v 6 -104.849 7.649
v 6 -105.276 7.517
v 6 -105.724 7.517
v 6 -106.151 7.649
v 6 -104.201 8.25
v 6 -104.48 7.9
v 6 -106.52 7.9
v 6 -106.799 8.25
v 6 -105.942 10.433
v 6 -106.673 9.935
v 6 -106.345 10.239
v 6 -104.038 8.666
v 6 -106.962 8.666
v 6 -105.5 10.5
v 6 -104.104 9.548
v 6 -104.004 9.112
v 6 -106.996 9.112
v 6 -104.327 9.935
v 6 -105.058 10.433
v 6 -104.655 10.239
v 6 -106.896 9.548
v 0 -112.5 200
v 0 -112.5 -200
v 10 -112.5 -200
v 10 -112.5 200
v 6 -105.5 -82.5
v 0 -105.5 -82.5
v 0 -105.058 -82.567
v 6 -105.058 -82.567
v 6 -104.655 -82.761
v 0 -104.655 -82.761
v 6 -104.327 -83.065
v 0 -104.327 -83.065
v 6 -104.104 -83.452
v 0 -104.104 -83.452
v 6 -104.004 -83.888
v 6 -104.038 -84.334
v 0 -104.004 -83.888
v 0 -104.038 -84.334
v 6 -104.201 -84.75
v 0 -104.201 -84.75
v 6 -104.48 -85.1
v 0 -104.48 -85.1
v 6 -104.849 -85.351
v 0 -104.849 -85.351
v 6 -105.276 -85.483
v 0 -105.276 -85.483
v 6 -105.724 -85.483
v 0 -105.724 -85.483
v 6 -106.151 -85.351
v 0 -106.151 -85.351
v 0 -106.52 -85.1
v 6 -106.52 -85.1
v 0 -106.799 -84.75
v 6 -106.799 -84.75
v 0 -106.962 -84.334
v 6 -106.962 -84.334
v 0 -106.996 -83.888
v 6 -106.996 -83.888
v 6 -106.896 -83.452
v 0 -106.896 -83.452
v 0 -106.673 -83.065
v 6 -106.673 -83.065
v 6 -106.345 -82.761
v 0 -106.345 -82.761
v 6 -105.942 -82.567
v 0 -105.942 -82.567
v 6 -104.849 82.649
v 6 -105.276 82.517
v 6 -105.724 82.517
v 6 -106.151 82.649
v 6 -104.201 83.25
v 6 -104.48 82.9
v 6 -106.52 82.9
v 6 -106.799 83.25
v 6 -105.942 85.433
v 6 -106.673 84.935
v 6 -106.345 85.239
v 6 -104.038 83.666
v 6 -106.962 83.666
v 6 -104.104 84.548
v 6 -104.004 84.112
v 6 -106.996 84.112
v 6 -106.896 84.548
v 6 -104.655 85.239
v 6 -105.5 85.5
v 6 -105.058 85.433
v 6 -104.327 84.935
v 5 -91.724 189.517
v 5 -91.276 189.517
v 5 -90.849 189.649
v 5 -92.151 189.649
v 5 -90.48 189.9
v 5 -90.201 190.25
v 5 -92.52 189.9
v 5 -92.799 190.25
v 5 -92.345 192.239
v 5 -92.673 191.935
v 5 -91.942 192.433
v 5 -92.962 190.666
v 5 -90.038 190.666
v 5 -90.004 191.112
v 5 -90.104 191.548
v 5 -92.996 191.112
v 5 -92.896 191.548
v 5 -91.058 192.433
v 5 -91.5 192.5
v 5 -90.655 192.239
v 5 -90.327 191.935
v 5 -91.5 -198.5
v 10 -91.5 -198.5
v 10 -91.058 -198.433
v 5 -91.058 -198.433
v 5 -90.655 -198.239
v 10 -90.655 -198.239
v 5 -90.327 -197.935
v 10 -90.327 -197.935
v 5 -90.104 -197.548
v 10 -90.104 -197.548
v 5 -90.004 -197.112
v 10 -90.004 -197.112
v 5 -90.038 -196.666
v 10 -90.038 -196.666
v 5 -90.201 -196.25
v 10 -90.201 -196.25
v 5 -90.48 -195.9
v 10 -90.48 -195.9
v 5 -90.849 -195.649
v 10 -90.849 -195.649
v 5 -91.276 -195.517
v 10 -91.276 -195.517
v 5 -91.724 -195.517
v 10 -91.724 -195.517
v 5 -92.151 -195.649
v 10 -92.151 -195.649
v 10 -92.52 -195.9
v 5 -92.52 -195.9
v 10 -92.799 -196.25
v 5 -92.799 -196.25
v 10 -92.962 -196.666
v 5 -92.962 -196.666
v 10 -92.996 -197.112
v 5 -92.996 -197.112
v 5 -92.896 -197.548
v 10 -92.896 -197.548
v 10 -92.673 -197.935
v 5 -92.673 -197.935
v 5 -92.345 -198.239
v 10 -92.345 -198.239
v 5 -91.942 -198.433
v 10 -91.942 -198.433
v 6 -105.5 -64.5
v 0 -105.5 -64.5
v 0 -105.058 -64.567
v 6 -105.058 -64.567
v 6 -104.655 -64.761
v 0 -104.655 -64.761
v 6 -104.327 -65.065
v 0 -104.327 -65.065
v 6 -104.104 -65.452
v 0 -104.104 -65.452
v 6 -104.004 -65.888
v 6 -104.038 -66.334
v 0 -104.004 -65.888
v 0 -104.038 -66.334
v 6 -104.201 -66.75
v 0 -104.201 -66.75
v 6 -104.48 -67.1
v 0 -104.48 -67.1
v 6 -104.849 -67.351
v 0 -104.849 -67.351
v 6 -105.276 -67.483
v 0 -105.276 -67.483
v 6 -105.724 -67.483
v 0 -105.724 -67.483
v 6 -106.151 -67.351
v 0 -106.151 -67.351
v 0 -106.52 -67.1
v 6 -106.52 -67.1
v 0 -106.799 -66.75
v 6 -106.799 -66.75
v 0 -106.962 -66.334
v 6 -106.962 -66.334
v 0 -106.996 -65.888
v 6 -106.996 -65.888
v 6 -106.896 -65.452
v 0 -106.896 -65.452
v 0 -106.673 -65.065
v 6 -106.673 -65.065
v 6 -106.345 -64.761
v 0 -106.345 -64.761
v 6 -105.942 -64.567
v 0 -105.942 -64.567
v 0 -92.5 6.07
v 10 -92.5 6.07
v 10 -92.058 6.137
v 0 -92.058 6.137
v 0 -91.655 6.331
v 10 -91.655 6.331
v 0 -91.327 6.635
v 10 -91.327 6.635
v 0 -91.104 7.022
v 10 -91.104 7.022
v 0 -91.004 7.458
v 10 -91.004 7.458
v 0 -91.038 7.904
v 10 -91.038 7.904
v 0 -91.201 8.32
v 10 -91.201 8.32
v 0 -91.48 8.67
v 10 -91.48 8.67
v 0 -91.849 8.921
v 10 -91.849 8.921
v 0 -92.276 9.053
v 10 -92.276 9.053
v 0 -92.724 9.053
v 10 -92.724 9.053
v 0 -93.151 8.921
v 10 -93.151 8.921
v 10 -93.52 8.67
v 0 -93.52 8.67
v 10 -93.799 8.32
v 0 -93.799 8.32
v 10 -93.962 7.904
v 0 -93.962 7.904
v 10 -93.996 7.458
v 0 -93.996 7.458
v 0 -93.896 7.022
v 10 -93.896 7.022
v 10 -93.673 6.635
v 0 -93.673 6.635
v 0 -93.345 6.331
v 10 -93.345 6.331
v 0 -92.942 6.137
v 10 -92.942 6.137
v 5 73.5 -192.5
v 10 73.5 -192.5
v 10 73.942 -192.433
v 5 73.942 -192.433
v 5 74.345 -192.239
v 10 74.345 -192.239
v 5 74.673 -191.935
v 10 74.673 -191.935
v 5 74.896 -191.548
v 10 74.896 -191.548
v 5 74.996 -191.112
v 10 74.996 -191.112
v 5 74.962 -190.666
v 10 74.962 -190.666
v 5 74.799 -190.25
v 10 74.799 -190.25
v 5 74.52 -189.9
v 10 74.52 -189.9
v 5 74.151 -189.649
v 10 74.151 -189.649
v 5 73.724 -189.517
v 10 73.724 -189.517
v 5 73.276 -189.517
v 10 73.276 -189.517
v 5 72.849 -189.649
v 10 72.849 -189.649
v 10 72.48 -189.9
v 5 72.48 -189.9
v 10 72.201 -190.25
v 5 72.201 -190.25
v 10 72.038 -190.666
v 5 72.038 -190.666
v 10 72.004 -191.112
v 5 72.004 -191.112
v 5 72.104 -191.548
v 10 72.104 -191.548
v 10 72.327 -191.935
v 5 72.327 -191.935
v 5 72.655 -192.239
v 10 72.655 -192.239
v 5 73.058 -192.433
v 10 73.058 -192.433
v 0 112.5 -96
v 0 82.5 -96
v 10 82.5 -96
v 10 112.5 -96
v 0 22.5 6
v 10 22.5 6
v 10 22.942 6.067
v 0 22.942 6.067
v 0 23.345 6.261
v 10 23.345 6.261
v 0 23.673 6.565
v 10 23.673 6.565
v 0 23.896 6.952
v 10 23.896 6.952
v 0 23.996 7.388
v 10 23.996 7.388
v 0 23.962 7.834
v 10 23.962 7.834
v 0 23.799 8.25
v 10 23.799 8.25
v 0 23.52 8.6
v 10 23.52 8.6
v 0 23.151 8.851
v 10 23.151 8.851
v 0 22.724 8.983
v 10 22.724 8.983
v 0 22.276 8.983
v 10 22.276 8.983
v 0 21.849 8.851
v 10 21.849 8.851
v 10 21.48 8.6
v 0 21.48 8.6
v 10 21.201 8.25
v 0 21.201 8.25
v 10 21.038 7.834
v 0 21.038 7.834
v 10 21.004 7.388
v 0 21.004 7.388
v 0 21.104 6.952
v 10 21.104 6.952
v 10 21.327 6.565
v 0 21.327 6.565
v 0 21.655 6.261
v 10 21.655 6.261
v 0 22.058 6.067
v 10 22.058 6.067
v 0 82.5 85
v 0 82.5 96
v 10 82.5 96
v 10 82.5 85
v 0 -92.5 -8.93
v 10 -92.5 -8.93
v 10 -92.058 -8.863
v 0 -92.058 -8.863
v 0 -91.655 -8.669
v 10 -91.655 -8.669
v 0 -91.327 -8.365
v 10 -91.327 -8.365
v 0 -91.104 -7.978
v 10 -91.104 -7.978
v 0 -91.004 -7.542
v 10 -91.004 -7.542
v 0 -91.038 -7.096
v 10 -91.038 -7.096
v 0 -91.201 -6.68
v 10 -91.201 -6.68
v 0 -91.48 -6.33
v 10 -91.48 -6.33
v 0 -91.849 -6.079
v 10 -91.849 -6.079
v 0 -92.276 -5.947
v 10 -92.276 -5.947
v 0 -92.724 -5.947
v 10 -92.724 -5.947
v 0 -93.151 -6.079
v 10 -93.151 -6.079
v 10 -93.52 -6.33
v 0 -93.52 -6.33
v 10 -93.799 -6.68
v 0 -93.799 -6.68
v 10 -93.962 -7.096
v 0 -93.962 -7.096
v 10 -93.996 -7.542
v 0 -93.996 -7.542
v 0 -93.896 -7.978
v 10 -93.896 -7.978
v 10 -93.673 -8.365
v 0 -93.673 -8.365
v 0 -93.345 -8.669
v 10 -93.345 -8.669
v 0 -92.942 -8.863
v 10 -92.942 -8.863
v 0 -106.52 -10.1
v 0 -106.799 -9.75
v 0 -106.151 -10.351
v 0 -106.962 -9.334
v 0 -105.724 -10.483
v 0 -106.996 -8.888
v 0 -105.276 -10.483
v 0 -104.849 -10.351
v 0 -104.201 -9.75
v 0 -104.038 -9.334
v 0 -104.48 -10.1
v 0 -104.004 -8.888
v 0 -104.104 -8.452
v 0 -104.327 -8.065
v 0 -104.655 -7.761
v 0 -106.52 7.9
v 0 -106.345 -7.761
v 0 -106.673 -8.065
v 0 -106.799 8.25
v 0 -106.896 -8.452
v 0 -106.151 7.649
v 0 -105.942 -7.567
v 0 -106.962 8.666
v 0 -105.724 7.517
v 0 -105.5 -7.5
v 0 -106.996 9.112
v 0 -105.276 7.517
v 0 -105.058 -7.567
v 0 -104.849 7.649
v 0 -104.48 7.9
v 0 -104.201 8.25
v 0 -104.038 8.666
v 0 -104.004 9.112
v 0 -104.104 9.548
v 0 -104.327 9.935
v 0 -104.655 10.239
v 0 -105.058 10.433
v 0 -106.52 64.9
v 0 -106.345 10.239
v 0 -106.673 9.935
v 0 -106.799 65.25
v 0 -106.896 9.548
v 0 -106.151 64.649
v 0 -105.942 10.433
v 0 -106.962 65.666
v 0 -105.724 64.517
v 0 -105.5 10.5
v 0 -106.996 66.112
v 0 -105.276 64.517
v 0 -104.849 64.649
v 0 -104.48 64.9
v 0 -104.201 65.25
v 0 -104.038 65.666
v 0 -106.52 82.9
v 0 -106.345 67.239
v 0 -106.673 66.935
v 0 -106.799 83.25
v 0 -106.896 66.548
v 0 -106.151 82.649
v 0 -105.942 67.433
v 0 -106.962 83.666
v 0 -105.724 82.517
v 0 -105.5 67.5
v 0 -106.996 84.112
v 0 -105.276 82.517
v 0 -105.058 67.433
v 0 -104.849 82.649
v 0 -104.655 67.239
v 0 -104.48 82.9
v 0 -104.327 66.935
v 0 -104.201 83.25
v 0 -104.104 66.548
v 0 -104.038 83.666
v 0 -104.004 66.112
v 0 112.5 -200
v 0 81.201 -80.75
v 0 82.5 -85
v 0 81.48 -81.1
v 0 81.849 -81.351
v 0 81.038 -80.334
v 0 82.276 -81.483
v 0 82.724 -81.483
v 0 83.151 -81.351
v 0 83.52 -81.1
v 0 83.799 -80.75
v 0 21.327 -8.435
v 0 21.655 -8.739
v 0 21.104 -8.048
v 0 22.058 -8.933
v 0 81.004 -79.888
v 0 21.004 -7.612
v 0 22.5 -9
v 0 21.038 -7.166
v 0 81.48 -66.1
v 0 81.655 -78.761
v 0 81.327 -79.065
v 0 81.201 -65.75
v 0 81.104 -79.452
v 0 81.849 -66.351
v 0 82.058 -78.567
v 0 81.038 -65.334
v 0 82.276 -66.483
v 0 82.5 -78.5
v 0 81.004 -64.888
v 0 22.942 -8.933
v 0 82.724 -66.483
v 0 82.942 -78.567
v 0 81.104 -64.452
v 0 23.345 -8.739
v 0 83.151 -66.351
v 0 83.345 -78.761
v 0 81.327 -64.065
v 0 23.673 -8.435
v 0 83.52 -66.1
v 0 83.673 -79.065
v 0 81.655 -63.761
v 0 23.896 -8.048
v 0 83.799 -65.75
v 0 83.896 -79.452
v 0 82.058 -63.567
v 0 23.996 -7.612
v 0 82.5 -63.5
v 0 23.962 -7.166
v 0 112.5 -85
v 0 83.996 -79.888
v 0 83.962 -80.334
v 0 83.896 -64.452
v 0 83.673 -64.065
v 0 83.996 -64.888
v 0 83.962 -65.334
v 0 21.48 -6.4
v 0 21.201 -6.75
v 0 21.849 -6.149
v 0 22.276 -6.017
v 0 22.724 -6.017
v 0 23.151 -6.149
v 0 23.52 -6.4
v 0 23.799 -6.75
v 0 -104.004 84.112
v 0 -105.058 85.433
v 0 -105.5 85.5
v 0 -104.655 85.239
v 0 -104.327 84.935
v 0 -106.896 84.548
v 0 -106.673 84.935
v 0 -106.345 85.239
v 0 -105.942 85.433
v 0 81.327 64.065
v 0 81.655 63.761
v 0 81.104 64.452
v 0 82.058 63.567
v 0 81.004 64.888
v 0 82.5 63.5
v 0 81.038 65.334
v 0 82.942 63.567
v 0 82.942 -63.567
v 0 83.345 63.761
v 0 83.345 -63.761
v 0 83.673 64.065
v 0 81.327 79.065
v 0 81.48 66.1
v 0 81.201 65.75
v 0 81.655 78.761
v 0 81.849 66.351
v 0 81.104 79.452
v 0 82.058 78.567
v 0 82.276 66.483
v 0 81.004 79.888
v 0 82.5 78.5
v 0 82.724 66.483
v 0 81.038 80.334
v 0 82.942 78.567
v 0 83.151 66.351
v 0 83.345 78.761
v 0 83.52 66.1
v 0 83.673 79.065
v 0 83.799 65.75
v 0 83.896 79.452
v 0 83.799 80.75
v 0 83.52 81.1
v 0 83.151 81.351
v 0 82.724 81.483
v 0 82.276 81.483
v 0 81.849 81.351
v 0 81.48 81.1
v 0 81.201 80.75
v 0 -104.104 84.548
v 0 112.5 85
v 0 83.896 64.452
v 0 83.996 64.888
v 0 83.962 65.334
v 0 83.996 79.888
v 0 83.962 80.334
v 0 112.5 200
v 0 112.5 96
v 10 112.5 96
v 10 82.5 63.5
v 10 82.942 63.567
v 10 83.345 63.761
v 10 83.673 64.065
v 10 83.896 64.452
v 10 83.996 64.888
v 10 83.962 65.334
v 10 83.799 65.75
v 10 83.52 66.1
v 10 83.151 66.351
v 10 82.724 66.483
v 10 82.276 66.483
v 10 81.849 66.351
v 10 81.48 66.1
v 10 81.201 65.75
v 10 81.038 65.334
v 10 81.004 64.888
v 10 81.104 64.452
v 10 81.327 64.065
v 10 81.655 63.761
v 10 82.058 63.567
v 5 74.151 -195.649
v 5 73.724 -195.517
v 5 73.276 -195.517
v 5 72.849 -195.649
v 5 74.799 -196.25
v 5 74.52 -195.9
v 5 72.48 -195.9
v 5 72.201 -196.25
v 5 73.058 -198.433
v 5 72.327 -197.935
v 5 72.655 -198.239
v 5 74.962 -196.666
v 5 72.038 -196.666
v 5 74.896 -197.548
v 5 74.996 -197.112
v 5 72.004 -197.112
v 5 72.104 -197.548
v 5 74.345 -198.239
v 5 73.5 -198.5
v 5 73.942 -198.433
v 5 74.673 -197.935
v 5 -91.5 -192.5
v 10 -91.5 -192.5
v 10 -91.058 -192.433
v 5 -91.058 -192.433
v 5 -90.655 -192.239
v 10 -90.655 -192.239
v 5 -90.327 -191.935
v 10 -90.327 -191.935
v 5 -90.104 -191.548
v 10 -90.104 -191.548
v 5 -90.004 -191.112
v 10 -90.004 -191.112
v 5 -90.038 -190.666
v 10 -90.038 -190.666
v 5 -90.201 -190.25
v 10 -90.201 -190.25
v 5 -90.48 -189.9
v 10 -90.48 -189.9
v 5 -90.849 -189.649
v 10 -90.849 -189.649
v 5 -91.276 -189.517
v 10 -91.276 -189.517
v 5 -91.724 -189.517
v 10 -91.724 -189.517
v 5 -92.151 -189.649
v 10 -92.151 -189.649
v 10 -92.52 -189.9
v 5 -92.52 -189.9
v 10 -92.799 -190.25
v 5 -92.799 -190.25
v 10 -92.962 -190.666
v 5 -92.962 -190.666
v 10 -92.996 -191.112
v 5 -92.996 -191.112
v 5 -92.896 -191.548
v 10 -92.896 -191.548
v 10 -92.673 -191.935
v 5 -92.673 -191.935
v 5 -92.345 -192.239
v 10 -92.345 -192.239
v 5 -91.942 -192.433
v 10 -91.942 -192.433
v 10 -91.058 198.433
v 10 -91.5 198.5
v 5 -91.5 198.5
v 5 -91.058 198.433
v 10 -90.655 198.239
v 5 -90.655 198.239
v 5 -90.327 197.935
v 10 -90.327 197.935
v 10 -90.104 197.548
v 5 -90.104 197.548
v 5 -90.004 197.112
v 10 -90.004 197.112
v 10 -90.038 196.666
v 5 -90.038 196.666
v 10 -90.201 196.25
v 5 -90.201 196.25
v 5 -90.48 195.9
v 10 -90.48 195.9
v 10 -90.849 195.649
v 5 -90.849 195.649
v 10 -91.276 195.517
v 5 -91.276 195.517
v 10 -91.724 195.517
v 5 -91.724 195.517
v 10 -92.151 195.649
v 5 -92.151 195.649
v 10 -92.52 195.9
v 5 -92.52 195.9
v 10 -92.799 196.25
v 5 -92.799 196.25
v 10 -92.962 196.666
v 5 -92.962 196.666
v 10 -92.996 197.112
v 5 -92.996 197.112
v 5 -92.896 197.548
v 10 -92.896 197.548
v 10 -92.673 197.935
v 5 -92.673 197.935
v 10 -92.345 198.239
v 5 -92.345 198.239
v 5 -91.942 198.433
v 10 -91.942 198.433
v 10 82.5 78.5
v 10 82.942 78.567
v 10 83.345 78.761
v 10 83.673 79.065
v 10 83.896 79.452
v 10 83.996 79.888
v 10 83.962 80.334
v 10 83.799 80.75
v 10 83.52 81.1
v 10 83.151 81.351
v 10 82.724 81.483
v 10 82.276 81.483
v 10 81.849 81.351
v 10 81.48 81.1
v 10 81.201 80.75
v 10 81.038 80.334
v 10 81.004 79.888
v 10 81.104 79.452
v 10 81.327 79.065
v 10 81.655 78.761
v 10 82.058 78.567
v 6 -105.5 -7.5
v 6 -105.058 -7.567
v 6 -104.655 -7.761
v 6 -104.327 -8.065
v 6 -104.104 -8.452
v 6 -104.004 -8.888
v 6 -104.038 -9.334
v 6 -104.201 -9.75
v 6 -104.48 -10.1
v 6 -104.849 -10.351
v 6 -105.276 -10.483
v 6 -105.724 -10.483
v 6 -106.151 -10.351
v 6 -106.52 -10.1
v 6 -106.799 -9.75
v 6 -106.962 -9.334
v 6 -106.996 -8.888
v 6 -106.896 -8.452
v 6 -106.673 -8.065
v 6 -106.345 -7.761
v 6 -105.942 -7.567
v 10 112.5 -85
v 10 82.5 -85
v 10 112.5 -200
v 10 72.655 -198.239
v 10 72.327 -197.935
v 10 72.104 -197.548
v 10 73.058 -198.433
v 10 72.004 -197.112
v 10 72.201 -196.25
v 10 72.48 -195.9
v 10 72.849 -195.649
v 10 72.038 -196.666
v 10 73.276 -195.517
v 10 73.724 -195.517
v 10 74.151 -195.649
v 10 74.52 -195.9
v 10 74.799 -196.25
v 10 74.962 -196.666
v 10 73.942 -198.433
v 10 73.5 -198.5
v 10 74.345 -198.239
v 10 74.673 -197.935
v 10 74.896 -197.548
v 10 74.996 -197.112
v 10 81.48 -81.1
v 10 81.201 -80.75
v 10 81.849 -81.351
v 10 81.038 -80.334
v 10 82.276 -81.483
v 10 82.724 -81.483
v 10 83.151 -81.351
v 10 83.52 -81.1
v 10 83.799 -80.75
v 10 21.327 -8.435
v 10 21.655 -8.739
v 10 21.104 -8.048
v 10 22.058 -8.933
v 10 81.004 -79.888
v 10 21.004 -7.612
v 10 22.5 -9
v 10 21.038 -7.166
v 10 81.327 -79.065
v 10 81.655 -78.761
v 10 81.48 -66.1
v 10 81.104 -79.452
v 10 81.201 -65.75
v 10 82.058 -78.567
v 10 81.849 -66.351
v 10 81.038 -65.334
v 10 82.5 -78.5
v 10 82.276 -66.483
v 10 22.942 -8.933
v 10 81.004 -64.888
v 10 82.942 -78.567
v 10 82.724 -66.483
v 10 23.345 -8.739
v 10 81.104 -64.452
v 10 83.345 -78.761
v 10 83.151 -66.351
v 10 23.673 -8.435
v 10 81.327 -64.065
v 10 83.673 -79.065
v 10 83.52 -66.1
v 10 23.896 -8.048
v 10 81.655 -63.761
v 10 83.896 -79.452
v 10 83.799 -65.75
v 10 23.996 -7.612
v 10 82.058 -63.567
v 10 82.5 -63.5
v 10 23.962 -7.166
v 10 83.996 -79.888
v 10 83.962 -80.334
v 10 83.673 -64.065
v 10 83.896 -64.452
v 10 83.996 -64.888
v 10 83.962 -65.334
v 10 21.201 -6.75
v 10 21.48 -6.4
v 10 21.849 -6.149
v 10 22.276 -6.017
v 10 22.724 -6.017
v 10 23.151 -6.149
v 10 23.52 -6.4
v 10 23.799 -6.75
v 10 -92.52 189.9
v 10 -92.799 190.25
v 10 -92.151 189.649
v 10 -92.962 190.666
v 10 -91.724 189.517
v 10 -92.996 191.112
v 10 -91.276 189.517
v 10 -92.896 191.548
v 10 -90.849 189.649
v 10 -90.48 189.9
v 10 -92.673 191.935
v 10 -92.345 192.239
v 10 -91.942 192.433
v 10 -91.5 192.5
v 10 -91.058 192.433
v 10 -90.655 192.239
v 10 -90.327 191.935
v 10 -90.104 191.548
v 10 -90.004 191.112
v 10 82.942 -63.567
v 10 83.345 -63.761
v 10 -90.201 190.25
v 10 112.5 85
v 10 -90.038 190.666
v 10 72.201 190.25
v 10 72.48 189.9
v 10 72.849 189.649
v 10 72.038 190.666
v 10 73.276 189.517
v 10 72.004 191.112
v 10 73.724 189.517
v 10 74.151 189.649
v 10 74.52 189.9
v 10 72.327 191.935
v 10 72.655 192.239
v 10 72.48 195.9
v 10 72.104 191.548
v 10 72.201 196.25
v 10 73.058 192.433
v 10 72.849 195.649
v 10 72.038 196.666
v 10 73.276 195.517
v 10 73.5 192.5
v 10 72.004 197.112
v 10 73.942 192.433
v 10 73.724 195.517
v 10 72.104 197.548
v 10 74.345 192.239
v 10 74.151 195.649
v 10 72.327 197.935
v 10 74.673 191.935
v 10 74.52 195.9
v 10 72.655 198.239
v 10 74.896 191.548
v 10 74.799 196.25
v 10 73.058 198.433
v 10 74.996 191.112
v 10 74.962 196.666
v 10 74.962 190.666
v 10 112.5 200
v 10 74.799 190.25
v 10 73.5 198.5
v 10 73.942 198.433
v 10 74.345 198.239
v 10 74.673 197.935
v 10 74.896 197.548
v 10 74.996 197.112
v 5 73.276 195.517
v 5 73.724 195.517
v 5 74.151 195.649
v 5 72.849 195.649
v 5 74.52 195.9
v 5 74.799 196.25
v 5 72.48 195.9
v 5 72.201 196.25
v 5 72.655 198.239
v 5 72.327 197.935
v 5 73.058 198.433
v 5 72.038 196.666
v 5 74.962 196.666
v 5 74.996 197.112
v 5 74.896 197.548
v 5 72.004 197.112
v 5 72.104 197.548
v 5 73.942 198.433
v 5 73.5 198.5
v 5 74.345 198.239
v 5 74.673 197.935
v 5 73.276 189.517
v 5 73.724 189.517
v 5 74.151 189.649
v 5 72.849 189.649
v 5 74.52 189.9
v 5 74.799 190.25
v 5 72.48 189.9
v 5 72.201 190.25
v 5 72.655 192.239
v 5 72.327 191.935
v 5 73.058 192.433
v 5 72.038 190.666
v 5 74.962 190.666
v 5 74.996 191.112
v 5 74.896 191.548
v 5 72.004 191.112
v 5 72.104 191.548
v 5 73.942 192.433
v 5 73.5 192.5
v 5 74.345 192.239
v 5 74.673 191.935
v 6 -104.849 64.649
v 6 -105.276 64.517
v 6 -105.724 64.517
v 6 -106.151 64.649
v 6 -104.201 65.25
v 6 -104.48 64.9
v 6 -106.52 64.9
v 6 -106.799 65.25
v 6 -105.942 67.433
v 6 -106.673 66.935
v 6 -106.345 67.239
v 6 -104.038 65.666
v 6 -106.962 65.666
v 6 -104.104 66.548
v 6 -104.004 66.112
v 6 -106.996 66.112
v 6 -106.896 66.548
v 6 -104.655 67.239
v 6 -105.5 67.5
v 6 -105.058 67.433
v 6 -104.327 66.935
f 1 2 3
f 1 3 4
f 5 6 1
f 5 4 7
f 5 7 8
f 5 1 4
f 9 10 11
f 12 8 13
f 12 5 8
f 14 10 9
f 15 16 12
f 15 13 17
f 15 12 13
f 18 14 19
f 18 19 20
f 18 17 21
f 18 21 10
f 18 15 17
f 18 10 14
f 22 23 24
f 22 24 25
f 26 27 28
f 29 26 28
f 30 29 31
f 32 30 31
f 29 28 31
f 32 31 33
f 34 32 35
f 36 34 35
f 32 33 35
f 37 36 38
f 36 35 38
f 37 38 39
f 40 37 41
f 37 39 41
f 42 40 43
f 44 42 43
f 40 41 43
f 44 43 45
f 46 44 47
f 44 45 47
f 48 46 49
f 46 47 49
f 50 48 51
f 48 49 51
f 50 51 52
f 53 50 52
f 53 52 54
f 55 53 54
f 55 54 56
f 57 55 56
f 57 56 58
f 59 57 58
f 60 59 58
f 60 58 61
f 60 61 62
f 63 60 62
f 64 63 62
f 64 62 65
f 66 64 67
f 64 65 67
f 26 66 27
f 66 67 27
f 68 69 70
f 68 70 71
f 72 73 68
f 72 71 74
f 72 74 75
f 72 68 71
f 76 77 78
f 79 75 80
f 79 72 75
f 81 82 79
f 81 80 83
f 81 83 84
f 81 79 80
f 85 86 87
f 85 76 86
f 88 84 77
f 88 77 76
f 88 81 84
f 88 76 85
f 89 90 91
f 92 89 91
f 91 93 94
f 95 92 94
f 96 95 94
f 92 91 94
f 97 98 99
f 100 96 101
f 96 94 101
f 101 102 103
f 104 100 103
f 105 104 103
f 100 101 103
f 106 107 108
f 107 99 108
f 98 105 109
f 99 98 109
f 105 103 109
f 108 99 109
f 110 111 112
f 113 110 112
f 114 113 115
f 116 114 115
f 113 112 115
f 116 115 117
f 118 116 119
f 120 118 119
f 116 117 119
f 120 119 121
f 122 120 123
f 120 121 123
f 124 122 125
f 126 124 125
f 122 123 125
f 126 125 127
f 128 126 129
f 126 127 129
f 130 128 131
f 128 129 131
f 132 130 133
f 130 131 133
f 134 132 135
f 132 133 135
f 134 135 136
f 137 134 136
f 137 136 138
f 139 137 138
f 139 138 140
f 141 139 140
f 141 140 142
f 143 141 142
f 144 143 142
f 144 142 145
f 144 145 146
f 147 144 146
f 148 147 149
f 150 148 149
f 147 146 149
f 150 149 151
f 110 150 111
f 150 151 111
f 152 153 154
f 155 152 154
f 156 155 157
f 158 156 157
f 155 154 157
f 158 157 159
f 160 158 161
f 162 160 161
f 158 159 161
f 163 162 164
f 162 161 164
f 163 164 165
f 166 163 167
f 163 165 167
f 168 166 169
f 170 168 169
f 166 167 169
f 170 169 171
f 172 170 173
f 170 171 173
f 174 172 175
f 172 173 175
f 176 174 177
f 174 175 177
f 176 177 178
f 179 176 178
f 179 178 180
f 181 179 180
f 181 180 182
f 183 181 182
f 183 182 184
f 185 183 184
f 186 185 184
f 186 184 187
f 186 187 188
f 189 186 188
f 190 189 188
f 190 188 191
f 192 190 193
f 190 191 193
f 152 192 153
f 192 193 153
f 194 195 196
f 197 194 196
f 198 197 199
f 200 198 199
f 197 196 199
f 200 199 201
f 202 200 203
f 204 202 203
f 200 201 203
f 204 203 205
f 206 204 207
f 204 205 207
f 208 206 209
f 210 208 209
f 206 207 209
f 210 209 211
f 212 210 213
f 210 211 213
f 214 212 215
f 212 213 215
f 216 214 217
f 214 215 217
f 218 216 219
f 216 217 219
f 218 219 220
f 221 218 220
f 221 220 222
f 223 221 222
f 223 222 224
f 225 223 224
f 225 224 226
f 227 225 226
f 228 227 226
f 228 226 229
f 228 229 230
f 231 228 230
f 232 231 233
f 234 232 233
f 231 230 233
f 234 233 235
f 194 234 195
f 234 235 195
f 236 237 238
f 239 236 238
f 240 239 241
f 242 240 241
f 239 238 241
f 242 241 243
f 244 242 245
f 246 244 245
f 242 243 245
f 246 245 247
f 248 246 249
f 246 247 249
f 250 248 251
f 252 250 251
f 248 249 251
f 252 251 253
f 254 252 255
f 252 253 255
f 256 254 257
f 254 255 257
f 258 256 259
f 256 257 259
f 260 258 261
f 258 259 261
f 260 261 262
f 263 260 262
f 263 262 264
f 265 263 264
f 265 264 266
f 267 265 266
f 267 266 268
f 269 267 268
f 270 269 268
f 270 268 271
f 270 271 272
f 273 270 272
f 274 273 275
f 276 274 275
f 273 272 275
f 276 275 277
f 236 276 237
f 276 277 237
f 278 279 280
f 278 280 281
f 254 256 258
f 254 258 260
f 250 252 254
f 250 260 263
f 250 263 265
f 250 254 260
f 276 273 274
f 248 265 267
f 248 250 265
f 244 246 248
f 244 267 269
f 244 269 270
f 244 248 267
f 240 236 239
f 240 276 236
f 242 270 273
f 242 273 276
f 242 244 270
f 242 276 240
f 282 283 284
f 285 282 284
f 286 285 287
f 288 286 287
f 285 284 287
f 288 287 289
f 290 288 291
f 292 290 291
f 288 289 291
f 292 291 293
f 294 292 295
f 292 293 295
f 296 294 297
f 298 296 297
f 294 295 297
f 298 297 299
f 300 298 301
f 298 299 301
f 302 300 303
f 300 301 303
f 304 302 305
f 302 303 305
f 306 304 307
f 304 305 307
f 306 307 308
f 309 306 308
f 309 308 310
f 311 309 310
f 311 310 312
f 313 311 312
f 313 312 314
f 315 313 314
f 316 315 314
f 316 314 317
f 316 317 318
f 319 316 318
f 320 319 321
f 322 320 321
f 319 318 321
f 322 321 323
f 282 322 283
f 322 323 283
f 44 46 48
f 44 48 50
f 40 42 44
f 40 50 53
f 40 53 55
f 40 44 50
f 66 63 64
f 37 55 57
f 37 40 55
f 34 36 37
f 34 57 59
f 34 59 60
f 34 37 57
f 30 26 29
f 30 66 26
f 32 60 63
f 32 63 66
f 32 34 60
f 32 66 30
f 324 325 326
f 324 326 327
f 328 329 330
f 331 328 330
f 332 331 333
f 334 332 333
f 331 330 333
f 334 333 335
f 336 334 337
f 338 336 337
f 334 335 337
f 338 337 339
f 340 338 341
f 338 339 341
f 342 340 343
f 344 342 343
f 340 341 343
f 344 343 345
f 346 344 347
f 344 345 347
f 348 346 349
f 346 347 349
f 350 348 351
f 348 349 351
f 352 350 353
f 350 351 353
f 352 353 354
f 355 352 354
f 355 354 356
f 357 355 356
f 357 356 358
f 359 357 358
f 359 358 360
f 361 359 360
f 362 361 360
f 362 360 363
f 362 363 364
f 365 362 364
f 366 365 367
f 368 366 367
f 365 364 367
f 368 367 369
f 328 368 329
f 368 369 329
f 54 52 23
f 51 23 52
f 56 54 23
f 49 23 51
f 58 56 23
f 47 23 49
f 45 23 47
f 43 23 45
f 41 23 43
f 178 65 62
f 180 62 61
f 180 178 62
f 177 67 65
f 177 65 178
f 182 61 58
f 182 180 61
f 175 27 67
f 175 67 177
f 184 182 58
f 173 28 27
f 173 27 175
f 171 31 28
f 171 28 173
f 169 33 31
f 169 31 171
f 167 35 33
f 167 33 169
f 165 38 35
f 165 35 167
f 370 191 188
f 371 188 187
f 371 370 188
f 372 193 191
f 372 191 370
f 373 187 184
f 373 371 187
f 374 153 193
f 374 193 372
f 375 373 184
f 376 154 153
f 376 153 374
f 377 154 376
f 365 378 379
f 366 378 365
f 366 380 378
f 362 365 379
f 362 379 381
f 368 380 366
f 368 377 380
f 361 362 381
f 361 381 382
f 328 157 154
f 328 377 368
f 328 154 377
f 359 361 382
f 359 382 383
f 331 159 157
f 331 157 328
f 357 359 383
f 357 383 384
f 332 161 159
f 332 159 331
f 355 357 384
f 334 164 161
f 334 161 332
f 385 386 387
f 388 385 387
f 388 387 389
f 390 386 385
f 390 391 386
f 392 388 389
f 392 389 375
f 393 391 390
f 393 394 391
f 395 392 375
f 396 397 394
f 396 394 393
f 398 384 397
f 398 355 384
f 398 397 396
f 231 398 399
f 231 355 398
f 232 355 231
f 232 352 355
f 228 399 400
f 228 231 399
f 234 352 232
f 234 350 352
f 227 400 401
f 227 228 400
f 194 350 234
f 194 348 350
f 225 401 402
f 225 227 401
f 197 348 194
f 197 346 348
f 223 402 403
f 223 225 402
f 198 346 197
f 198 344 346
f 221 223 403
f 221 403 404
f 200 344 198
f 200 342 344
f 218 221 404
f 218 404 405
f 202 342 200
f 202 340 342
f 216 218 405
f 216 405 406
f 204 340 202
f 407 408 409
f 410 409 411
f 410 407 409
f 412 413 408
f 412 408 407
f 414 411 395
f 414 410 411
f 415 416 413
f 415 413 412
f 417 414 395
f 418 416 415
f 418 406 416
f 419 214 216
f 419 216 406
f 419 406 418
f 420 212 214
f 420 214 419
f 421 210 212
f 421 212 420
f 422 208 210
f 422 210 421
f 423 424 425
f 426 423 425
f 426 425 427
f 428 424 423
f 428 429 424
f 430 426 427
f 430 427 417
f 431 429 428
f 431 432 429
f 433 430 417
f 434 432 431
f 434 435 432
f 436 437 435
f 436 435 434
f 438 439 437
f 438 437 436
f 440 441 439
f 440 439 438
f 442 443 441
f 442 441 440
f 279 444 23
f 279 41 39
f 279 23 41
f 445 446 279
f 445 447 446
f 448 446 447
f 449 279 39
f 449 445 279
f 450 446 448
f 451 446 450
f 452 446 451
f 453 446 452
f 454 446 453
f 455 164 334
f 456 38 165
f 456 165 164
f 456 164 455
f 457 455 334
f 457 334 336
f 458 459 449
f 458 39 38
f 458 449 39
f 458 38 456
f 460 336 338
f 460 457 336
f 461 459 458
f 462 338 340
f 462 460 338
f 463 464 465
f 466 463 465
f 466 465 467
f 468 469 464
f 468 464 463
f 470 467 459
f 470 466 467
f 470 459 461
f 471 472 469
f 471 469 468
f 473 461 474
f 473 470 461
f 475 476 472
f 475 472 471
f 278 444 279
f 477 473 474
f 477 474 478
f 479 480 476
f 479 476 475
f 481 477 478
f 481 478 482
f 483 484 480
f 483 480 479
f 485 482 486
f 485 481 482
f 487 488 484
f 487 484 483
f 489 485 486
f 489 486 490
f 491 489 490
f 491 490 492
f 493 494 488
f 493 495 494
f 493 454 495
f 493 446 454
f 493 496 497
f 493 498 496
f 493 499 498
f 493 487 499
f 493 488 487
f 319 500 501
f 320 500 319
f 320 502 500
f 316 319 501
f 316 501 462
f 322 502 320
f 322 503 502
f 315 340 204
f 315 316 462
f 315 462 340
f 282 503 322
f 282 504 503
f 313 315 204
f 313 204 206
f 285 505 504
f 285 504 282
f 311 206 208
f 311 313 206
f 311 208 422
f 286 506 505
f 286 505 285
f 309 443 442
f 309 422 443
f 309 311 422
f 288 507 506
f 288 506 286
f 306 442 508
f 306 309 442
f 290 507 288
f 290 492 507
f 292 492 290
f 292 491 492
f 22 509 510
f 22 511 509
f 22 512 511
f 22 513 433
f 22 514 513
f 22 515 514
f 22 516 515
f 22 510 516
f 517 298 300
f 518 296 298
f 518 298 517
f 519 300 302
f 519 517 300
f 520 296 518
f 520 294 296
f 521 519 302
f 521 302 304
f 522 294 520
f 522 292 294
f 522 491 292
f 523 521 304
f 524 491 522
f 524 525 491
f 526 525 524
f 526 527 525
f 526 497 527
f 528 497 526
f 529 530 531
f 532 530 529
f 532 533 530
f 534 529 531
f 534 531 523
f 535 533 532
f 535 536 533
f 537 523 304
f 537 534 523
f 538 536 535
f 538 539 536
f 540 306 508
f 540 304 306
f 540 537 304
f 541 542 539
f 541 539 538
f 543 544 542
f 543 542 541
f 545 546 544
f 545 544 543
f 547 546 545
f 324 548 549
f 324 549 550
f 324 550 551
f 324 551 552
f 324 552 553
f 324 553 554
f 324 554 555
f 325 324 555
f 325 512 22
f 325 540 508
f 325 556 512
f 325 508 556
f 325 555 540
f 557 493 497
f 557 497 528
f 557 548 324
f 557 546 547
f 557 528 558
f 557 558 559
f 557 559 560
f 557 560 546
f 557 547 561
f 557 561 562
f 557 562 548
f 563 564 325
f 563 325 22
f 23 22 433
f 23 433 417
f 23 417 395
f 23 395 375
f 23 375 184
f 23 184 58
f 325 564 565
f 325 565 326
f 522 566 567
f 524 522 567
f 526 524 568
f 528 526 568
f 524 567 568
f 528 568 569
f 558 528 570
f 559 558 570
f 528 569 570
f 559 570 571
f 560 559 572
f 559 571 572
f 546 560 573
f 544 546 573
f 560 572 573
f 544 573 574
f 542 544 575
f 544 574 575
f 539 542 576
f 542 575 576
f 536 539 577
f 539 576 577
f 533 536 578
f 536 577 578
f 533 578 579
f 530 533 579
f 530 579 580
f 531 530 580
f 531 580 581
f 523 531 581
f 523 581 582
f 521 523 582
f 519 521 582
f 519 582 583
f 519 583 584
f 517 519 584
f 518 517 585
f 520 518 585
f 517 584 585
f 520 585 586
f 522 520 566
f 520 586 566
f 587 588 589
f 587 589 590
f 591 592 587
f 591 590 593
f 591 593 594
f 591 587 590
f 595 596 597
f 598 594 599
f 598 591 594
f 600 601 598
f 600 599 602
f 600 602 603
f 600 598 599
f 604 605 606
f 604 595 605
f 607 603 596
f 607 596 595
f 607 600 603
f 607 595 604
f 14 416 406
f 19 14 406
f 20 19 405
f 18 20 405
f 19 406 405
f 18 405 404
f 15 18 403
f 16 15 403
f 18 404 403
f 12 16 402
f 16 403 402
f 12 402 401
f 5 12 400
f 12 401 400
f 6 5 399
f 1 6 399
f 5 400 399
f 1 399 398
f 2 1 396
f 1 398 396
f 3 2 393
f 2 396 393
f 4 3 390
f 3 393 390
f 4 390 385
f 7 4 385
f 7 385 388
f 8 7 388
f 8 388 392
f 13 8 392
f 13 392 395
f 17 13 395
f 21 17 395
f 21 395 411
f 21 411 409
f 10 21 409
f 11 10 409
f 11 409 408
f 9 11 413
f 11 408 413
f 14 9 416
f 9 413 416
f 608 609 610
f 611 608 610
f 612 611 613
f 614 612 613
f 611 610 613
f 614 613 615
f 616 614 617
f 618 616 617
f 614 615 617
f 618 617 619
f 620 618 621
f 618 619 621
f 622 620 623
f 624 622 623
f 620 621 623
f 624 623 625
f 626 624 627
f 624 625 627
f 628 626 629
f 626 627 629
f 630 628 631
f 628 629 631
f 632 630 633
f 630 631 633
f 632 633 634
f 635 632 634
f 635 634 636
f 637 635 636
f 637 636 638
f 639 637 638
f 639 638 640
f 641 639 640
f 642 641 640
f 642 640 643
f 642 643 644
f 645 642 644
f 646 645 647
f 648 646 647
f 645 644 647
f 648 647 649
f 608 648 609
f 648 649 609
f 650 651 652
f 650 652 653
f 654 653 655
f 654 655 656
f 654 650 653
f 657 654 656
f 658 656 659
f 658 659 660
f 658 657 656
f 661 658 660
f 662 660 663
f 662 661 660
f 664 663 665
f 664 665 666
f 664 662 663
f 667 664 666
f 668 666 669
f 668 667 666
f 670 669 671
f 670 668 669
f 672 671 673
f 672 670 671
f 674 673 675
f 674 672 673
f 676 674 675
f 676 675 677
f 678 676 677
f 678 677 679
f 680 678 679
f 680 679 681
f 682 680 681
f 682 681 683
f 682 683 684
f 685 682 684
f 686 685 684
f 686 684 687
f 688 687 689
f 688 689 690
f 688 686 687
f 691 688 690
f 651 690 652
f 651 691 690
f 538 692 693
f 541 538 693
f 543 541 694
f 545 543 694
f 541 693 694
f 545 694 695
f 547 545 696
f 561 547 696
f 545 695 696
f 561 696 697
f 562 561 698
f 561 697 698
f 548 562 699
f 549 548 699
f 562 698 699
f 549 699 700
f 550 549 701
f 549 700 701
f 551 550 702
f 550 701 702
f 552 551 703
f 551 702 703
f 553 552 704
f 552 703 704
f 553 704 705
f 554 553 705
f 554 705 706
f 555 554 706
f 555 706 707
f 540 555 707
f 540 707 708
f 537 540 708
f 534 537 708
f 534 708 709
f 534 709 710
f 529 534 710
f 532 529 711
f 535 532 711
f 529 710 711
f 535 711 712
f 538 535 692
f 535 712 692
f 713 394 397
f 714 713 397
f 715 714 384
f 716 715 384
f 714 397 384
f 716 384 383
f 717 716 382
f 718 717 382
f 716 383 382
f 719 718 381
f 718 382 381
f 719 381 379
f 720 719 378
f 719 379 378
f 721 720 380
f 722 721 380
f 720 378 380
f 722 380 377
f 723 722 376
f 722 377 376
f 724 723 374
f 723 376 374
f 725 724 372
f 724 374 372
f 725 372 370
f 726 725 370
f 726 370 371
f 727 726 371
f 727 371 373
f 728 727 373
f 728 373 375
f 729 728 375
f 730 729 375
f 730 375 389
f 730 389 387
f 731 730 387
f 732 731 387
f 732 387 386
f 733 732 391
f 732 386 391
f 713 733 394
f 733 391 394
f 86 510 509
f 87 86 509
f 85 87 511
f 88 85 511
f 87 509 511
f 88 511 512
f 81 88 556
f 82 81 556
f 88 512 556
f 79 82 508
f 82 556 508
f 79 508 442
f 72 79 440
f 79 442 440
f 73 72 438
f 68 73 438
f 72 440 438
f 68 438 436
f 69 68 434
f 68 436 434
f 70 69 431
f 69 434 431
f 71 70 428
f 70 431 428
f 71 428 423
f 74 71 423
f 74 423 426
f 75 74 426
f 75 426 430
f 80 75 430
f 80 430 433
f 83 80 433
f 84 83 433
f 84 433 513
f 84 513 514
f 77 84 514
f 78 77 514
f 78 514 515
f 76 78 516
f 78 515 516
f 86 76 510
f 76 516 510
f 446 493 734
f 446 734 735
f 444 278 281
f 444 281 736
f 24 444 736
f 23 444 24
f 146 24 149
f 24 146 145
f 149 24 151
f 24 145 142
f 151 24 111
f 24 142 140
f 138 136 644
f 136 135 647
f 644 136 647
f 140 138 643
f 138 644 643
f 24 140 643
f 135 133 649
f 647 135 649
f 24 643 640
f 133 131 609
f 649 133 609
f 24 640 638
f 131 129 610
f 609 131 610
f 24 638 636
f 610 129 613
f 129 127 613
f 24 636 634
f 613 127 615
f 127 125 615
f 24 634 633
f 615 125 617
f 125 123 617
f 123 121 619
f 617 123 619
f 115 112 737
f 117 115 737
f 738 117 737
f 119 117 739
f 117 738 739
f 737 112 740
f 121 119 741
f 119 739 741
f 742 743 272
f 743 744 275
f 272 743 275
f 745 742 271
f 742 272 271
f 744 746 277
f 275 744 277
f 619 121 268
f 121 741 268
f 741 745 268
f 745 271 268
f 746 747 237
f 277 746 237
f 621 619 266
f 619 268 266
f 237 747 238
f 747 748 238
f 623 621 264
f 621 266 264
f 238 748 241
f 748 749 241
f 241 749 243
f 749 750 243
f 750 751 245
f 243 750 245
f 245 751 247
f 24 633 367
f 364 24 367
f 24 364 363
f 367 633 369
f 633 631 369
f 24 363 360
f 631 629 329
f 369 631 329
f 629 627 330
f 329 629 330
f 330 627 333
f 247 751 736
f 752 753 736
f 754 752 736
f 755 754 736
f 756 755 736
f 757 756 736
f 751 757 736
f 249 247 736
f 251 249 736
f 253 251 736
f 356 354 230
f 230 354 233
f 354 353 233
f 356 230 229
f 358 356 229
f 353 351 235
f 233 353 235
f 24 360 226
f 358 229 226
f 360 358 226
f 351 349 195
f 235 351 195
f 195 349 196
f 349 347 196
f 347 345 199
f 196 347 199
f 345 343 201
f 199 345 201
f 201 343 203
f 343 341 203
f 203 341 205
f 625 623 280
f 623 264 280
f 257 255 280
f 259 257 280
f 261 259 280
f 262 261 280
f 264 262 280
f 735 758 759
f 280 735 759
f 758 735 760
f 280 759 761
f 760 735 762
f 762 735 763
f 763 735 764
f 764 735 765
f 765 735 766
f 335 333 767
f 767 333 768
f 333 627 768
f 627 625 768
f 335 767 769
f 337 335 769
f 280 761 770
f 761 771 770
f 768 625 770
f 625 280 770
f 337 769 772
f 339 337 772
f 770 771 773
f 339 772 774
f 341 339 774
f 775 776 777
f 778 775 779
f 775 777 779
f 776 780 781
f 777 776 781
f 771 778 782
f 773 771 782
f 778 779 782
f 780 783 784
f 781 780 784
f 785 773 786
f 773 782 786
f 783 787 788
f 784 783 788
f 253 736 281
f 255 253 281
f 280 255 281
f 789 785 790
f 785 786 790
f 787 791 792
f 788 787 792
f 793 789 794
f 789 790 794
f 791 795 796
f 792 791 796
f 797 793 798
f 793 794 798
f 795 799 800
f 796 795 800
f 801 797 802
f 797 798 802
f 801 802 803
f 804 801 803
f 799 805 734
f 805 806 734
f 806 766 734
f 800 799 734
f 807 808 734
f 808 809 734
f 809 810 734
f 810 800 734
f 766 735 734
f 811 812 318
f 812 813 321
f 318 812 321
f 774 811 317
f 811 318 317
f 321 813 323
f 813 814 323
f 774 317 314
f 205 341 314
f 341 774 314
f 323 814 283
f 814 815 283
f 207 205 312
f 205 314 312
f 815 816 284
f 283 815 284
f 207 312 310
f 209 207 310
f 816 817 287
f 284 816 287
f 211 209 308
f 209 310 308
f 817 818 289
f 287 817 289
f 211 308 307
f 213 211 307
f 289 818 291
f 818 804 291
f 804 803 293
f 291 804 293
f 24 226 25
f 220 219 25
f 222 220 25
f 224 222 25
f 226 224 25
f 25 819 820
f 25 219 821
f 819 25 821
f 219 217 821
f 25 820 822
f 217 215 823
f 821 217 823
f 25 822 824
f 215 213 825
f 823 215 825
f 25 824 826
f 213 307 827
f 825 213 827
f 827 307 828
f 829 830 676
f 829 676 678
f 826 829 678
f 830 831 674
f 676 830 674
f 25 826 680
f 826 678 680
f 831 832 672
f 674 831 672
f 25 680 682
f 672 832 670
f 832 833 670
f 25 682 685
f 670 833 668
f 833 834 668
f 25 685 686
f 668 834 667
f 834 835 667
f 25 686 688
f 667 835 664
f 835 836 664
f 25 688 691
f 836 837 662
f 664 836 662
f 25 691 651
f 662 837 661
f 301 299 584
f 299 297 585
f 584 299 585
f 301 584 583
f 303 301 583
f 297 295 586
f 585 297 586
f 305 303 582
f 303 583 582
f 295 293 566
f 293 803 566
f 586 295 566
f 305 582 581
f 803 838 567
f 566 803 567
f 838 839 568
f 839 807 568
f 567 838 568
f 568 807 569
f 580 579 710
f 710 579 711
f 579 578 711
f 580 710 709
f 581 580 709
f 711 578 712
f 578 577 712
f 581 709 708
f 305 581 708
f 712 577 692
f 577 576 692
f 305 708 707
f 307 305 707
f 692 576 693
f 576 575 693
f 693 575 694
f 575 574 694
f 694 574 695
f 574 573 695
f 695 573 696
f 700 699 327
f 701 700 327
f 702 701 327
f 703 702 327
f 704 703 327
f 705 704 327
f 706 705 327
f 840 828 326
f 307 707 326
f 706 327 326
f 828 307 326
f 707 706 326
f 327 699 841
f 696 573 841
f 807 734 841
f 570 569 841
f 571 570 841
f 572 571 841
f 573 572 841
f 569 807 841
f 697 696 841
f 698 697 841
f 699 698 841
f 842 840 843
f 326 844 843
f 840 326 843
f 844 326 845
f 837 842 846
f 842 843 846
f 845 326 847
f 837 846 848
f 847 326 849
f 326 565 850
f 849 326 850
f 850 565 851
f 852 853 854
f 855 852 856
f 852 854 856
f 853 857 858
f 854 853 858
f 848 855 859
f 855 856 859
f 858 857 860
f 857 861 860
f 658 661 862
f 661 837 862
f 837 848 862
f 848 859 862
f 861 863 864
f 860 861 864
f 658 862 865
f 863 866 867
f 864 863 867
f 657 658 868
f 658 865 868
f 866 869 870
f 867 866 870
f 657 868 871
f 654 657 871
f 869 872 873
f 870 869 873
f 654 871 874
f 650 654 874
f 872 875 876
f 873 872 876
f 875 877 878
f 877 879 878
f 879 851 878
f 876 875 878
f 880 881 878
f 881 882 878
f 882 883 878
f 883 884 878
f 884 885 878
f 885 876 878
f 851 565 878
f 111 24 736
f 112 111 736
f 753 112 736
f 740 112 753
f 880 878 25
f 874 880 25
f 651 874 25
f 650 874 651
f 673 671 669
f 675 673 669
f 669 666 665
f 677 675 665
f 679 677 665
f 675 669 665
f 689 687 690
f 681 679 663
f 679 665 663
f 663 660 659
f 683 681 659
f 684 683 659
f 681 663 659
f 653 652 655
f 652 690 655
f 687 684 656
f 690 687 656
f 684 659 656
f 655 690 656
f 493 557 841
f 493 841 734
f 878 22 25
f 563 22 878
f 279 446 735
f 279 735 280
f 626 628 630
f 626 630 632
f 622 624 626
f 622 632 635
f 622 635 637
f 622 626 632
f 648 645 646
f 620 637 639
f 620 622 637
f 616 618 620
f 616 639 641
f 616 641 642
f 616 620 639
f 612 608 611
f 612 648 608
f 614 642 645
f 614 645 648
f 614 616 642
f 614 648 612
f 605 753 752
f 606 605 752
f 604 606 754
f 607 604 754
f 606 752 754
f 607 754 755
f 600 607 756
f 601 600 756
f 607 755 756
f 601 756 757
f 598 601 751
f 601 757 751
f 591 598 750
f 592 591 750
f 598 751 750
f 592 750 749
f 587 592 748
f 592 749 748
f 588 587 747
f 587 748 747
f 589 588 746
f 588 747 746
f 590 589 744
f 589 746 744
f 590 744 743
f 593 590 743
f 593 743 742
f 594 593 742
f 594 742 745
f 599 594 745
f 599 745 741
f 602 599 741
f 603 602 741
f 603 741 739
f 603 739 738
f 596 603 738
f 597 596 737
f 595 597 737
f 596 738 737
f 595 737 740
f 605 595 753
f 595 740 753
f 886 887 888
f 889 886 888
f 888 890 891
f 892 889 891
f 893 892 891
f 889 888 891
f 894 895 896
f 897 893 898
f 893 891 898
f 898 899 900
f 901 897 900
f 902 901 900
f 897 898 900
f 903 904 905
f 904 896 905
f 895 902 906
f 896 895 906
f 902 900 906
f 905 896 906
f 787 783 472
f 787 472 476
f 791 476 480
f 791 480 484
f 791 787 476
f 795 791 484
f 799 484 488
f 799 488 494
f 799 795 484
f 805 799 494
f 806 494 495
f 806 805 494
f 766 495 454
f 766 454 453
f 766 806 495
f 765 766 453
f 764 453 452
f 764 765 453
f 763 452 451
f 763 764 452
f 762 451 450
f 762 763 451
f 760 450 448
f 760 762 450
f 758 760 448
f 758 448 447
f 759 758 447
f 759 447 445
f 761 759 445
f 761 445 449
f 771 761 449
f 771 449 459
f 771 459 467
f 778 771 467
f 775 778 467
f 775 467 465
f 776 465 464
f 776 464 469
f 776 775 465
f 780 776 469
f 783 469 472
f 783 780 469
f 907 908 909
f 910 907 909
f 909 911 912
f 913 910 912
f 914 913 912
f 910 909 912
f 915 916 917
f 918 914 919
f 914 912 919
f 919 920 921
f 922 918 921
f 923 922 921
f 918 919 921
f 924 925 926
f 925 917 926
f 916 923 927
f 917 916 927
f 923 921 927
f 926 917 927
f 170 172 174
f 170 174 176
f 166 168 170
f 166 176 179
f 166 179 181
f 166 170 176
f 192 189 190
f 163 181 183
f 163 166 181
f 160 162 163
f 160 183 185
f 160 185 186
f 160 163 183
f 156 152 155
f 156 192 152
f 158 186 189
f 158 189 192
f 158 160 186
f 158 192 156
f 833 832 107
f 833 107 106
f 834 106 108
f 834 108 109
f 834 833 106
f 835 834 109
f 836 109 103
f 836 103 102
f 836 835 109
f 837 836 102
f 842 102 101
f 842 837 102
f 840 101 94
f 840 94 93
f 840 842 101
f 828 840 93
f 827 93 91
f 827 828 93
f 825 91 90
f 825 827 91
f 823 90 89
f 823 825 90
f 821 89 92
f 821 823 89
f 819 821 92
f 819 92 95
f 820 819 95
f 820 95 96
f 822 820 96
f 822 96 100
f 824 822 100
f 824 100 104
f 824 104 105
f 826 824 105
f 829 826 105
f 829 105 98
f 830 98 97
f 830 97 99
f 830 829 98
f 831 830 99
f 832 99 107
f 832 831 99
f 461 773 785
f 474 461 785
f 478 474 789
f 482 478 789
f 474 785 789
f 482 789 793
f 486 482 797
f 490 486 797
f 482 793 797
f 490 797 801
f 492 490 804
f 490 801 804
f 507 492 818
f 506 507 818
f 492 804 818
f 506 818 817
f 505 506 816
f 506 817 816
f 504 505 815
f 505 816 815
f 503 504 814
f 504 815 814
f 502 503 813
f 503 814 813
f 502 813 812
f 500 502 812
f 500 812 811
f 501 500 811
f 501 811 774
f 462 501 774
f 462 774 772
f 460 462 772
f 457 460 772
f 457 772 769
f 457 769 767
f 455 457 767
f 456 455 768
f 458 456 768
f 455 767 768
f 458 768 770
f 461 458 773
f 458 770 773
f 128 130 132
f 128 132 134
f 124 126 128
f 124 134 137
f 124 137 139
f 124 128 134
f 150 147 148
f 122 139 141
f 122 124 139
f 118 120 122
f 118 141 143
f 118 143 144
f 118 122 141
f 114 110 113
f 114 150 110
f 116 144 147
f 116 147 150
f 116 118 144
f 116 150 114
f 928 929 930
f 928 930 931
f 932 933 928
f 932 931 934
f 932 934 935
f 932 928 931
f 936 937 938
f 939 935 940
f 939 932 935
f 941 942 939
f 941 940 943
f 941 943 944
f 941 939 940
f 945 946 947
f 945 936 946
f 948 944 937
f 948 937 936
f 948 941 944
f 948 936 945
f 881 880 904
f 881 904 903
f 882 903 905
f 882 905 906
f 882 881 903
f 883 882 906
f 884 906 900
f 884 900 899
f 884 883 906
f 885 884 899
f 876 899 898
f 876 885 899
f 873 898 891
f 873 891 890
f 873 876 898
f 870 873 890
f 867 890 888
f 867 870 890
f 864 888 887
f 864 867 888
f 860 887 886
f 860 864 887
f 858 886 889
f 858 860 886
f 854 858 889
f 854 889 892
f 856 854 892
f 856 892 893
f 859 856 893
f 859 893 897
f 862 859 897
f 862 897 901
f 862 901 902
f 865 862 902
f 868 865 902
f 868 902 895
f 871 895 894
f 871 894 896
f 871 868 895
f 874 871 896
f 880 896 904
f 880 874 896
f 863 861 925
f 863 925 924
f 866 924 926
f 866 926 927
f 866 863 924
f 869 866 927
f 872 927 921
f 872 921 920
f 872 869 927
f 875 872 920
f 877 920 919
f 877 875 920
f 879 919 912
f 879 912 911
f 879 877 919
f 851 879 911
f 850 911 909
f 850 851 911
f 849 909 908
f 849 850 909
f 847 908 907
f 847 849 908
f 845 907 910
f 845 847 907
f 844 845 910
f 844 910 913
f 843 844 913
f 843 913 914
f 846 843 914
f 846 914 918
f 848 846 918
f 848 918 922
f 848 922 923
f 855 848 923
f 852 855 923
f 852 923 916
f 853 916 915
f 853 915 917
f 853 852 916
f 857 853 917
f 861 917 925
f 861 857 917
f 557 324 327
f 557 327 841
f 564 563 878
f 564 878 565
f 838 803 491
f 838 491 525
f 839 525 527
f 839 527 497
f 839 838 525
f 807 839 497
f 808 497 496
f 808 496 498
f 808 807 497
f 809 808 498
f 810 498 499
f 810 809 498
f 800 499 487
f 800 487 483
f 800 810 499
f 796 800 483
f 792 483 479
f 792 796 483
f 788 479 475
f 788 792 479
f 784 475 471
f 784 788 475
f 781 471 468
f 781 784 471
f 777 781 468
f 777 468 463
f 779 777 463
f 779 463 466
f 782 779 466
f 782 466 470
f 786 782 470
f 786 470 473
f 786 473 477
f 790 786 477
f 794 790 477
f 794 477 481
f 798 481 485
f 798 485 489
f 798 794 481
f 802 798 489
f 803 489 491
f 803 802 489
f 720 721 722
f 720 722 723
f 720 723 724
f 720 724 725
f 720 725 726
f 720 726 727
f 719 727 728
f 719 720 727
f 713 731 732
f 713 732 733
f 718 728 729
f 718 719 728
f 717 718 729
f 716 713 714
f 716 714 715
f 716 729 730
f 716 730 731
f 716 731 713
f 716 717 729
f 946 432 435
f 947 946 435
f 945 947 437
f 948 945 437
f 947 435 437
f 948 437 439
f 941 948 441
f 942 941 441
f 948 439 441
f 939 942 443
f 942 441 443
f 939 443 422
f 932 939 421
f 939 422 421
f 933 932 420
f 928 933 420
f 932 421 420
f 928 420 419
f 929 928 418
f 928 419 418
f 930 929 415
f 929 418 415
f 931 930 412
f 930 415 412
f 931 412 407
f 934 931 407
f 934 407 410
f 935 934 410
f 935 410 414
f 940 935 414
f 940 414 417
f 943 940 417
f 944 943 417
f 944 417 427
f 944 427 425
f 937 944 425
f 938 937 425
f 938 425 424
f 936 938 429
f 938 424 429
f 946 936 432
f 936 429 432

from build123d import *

# Parameters (mm, degrees)
EXTRUDE_1_DEPTH     = 10
SKETCH_2_R          = 1.5
CUT_EXTRUDE_1_DEPTH = 6
SKETCH_3_R          = 1.5
CUT_EXTRUDE_2_DEPTH = 5
SKETCH_4_R          = 1.5
CUT_EXTRUDE_3_DEPTH = 10
SKETCH_5_R          = 1.5
CUT_EXTRUDE_4_DEPTH = 10
SKETCH_6_R          = 1.5
CUT_EXTRUDE_5_DEPTH = 10


with BuildPart() as part:
    # 草图1 → 凸台-拉伸1 (new body)
    with BuildSketch(Plane(origin=(0, 0, 0), x_dir=(0, 0, -1), z_dir=(1, 0, 0))):
        Polygon((96, 112.5), (200, 112.5), (200, -112.5), (-200, -112.5), (-200, 112.5), (-96, 112.5), (-96, 82.5), (-85, 82.5), (-85, 112.5), (85, 112.5), (85, 82.5), (96, 82.5), align=None)
    extrude(amount=EXTRUDE_1_DEPTH)

    # 草图2 → 切除-拉伸1 (cut)
    with BuildSketch(Plane.ZY):
        with Locations((-84, -105.5)):
            Circle(SKETCH_2_R)
        with Locations((-66, -105.5)):
            Circle(SKETCH_2_R)
        with Locations((-9, -105.5)):
            Circle(SKETCH_2_R)
        with Locations((9, -105.5)):
            Circle(SKETCH_2_R)
        with Locations((66, -105.5)):
            Circle(SKETCH_2_R)
        with Locations((84, -105.5)):
            Circle(SKETCH_2_R)
    extrude(amount=-CUT_EXTRUDE_1_DEPTH, mode=Mode.SUBTRACT)

    # 草图3 → 切除-拉伸2 (cut)
    with BuildSketch(Plane(origin=(10, 0, 0), x_dir=(0, 0, -1), z_dir=(1, 0, 0))):
        with Locations((197, -91.5)):
            Circle(SKETCH_3_R)
        with Locations((191, -91.5)):
            Circle(SKETCH_3_R)
        with Locations((191, 73.5)):
            Circle(SKETCH_3_R)
        with Locations((197, 73.5)):
            Circle(SKETCH_3_R)
    cut_extrude_2 = extrude(amount=-CUT_EXTRUDE_2_DEPTH, mode=Mode.SUBTRACT)

    # 镜向1: 切除-拉伸2 across plane
    add(cut_extrude_2.mirror(Plane.XY), mode=Mode.SUBTRACT)

    # 草图4 → 切除-拉伸3 (cut)
    with BuildSketch(Plane(origin=(10, 0, 0), x_dir=(0, 0, -1), z_dir=(1, 0, 0))):
        with Locations((7.43, -92.5)):
            Circle(SKETCH_4_R)
        with Locations((-7.57, -92.5)):
            Circle(SKETCH_4_R)
    extrude(amount=-CUT_EXTRUDE_3_DEPTH, mode=Mode.SUBTRACT)

    # 草图5 → 切除-拉伸4 (cut)
    with BuildSketch(Plane(origin=(10, 0, 0), x_dir=(0, 0, -1), z_dir=(1, 0, 0))):
        with Locations((-80, 82.5)):
            Circle(SKETCH_5_R)
        with Locations((-65, 82.5)):
            Circle(SKETCH_5_R)
    cut_extrude_4 = extrude(amount=-CUT_EXTRUDE_4_DEPTH, mode=Mode.SUBTRACT)

    # 镜向2: 切除-拉伸4 across plane
    add(cut_extrude_4.mirror(Plane.XY), mode=Mode.SUBTRACT)

    # 草图6 → 切除-拉伸5 (cut)
    with BuildSketch(Plane(origin=(10, 0, 0), x_dir=(0, 0, -1), z_dir=(1, 0, 0))):
        with Locations((-7.5, 22.5)):
            Circle(SKETCH_6_R)
        with Locations((7.5, 22.5)):
            Circle(SKETCH_6_R)
    extrude(amount=-CUT_EXTRUDE_5_DEPTH, mode=Mode.SUBTRACT)


solid = part.part
